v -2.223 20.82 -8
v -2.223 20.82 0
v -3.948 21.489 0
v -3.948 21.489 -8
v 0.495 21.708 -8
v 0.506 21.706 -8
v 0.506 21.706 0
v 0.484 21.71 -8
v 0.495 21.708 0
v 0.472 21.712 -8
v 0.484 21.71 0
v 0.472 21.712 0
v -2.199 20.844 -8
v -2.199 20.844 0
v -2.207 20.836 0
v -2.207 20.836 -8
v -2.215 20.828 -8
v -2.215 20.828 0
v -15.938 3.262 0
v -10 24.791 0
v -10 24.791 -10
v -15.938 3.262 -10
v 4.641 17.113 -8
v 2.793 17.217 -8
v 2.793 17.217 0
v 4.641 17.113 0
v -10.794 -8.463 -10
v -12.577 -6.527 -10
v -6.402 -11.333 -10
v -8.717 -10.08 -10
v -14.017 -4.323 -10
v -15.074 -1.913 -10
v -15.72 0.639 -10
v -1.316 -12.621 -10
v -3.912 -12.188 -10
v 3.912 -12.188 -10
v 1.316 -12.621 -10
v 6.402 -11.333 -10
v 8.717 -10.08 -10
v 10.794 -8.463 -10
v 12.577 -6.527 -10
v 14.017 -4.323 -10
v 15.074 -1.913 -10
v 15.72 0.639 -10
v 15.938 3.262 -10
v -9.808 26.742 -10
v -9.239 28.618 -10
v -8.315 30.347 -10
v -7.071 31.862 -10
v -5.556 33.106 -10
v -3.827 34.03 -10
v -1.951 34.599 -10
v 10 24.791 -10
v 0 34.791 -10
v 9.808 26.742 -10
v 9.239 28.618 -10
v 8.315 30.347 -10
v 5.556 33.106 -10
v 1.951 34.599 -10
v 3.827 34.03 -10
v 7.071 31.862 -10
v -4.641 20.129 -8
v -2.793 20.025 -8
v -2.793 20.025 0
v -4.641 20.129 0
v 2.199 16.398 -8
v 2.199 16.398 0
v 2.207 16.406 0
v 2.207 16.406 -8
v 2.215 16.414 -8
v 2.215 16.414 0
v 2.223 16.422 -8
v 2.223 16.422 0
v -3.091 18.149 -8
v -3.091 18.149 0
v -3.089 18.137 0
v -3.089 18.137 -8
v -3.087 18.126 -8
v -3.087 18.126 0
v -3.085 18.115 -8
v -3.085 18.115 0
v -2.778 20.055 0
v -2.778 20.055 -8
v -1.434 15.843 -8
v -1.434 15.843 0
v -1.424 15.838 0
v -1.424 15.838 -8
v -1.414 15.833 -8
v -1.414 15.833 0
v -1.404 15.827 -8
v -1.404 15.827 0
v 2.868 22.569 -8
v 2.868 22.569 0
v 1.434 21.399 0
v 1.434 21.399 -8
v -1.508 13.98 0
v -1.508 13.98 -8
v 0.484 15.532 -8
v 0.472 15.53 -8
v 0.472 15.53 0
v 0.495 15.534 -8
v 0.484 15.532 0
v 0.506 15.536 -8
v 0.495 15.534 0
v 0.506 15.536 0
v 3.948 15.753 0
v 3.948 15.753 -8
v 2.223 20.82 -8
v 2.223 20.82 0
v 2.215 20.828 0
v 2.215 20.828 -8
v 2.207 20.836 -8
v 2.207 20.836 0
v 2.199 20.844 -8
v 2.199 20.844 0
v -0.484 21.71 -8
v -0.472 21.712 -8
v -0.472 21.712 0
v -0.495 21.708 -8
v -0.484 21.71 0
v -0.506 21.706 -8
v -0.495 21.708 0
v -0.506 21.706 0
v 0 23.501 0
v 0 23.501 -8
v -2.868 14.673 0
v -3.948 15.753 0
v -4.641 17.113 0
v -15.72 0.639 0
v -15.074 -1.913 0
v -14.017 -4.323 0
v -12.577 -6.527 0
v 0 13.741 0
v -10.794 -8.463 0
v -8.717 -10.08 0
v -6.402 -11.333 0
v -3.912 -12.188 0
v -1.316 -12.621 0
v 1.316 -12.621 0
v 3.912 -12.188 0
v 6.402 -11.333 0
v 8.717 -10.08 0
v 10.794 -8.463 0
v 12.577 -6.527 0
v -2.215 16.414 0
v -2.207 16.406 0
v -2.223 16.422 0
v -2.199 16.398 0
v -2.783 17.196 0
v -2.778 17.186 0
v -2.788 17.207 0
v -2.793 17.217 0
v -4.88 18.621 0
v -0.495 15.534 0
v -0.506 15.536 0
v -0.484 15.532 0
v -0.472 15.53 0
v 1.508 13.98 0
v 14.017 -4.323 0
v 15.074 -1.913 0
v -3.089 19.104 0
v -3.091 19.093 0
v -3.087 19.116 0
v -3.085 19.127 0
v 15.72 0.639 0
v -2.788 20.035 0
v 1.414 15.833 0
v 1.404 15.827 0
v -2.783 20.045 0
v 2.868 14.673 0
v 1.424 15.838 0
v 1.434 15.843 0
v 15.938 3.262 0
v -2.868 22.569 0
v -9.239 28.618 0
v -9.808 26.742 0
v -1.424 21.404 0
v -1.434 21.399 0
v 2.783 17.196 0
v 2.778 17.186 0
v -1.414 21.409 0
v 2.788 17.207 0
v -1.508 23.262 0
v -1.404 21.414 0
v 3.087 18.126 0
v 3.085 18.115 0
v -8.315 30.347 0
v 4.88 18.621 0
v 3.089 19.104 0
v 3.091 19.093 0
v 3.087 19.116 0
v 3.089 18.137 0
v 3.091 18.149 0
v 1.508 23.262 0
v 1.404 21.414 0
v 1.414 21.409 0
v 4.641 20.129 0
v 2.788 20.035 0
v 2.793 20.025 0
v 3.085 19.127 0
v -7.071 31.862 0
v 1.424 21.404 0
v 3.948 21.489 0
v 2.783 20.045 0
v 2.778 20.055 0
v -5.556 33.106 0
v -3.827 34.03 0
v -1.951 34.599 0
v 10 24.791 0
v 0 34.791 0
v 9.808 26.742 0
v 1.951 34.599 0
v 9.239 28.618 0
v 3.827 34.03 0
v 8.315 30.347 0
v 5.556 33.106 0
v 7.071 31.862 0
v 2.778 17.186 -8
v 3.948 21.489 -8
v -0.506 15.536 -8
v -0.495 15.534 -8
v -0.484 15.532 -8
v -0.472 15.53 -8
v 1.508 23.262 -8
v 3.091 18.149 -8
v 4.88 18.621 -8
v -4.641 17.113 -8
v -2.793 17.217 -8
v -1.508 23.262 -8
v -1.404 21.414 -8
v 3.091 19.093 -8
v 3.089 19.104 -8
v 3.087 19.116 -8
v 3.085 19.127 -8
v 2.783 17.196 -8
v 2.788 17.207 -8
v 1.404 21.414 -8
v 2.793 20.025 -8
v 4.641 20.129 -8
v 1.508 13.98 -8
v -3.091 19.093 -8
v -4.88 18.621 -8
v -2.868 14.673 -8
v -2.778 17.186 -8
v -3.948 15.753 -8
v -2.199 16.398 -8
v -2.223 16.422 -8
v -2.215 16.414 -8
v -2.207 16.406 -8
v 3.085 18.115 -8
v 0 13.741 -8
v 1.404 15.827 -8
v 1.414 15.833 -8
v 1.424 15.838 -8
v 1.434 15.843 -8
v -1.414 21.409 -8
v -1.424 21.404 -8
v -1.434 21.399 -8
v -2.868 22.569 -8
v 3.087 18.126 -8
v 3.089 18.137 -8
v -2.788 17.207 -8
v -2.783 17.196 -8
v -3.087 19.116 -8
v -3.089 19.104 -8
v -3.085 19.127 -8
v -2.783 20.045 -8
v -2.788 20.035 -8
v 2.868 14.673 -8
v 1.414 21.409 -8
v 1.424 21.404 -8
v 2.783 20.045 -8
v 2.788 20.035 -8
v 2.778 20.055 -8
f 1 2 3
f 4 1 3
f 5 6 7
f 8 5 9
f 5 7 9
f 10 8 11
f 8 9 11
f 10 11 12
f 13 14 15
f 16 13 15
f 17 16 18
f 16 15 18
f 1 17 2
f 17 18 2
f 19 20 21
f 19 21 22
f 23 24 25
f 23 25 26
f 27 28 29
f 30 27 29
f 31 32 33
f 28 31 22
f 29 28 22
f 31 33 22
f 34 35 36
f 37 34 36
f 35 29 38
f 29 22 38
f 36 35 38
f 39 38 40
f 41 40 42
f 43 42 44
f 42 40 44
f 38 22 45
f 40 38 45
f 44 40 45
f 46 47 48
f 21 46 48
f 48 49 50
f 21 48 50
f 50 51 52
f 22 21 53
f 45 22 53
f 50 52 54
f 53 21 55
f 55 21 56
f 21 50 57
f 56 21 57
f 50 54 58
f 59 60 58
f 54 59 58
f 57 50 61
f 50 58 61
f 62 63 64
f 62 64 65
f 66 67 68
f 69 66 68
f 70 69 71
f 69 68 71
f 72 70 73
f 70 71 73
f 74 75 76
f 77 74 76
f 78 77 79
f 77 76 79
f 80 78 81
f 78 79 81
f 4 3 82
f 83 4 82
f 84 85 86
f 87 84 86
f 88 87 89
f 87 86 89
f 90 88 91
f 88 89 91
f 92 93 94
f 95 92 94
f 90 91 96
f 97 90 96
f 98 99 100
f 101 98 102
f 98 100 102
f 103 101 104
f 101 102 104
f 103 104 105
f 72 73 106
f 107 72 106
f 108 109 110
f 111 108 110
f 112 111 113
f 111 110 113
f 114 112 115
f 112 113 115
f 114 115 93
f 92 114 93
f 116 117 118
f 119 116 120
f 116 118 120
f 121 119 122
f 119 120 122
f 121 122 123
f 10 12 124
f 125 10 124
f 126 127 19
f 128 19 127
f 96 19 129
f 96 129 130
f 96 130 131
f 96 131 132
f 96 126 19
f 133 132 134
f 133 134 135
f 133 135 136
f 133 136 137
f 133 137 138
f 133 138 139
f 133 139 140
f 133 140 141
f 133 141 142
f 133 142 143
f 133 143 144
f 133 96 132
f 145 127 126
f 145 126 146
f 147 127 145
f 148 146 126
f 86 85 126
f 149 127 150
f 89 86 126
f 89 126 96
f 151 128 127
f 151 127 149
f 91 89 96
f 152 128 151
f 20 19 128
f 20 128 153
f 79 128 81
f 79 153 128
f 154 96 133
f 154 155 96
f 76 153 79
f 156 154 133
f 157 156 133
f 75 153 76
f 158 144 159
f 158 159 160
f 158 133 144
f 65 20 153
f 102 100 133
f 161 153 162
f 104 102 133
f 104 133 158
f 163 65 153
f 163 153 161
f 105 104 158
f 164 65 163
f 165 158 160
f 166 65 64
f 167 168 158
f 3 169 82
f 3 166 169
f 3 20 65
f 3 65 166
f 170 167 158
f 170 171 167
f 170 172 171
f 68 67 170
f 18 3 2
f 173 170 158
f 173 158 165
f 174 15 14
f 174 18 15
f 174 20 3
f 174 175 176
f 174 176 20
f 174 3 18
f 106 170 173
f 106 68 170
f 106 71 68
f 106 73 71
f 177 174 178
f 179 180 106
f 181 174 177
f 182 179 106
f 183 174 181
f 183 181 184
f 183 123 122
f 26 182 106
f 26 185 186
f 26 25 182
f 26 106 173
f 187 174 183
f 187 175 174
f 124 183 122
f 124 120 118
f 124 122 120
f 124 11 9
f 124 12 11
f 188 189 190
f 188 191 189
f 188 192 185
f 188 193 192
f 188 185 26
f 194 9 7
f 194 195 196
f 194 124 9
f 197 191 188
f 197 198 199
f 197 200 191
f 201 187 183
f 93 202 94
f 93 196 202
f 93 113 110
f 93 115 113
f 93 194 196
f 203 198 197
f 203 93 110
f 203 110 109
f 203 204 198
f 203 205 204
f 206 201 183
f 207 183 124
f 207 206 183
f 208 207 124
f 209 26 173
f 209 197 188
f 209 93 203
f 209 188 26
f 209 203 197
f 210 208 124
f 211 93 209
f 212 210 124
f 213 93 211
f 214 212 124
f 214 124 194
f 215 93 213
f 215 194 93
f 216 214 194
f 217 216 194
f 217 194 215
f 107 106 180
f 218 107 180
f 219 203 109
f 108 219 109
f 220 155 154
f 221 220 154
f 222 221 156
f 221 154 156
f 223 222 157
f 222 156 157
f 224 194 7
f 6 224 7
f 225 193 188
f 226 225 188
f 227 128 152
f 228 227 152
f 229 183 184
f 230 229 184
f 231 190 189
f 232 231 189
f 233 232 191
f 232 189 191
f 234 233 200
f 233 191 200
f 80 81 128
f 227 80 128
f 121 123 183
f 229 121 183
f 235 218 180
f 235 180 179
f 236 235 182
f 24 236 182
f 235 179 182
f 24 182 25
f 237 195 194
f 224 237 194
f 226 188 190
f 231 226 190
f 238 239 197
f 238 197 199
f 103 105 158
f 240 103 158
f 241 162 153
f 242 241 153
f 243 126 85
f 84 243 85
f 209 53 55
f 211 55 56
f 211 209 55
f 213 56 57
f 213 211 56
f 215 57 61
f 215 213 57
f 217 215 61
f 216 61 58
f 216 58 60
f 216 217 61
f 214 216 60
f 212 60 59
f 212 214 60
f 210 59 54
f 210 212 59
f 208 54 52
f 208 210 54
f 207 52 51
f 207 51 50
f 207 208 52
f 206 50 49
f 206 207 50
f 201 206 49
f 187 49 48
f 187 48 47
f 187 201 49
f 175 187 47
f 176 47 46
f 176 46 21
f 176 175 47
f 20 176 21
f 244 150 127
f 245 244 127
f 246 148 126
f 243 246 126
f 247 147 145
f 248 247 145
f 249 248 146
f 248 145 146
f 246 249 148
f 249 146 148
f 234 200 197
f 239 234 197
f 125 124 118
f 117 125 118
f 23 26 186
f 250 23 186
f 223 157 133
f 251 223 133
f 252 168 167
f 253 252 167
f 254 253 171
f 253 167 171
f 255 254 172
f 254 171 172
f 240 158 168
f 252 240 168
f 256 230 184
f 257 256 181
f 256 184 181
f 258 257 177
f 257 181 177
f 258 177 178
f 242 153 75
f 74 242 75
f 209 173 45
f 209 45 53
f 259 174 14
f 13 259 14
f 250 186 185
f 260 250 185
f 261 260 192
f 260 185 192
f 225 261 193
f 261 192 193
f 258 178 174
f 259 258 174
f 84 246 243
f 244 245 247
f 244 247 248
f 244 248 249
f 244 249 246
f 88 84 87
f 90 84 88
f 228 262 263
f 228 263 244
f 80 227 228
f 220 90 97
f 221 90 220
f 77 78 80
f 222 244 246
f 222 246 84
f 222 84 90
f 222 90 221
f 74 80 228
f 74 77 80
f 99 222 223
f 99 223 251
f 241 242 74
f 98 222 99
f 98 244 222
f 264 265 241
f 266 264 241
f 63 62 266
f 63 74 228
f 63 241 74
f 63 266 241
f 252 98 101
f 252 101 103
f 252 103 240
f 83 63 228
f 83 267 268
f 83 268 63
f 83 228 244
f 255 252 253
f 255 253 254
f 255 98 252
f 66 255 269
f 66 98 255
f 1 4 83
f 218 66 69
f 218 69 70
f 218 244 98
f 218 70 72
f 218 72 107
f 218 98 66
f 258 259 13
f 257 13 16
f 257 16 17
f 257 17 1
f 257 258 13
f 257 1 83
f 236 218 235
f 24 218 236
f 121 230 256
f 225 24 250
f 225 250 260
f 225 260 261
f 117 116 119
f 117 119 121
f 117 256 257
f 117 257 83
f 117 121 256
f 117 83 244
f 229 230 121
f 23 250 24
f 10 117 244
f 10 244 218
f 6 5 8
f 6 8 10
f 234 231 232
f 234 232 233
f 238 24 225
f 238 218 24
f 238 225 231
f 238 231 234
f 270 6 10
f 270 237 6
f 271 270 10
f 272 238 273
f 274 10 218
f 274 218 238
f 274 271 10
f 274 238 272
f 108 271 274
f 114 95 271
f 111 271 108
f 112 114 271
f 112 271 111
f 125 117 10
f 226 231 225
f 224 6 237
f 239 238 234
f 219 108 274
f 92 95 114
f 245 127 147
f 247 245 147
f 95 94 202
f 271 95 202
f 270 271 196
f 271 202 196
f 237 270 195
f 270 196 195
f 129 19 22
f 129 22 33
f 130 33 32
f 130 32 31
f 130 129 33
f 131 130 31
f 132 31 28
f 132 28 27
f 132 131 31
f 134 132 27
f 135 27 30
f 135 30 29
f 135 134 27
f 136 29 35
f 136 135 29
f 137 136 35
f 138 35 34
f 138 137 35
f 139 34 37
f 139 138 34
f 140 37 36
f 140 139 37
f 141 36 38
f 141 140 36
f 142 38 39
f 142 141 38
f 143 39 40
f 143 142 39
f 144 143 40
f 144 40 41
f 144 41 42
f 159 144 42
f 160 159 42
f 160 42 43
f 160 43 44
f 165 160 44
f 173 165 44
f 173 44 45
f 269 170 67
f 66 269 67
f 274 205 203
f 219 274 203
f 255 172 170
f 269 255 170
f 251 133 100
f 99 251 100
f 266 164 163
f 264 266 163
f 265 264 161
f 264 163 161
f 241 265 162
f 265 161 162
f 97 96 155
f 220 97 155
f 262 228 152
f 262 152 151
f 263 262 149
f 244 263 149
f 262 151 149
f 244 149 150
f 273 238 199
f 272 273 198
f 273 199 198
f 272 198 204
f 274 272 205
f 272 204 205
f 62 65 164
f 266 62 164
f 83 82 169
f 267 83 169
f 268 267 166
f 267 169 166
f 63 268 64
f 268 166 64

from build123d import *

# Parameters (mm, degrees)
EXTRUDE_1_DEPTH     = 10
CUT_EXTRUDE_2_DEPTH = 8


with BuildPart() as part:
    # 草图1 → 凸台-拉伸1 (new body)
    with BuildSketch(Plane.XY):
        with BuildLine():
            Line((-10, 24.791076412), (-15.93770494, 3.262397709))
            ThreePointArc((-15.93770494, 3.262397709), (0, -12.675307231), (15.93770494, 3.262397709))
            Line((15.93770494, 3.262397709), (10, 24.791076412))
            ThreePointArc((10, 24.791076412), (0, 34.791076412), (-10, 24.791076412))
        make_face()
    extrude(amount=-EXTRUDE_1_DEPTH)

    # 草图3 → 切除-拉伸2 (cut)
    with BuildSketch(Plane.XY):
        with BuildLine():
            Line((0, 23.501027712), (-0.472402553, 21.711669494))
            ThreePointArc((-0.472402553, 21.711669494), (-0.489109338, 21.709069686), (-0.50580182, 21.70637957))
            Line((-0.50580182, 21.70637957), (-1.508025445, 23.262179946))
            Line((-1.508025445, 23.262179946), (-1.404364874, 21.414418736))
            ThreePointArc((-1.404364874, 21.414418736), (-1.419450586, 21.40678349), (-1.434494788, 21.399066778))
            Line((-1.434494788, 21.399066778), (-2.868434853, 22.569016731))
            Line((-2.868434853, 22.569016731), (-2.198858175, 20.84372427))
            ThreePointArc((-2.198858175, 20.84372427), (-2.210846119, 20.831800979), (-2.22276941, 20.819813035))
            Line((-2.22276941, 20.819813035), (-3.948061872, 21.489389712))
            Line((-3.948061872, 21.489389712), (-2.778111918, 20.055449647))
            ThreePointArc((-2.778111918, 20.055449647), (-2.785828631, 20.040405445), (-2.793463876, 20.025319733))
            Line((-2.793463876, 20.025319733), (-4.641225087, 20.128980305))
            Line((-4.641225087, 20.128980305), (-3.085424711, 19.12675668))
            ThreePointArc((-3.085424711, 19.12675668), (-3.088114827, 19.110064198), (-3.090714635, 19.093357413))
            Line((-3.090714635, 19.093357413), (-4.880072853, 18.620954859))
            Line((-4.880072853, 18.620954859), (-3.090714635, 18.148552306))
            ThreePointArc((-3.090714635, 18.148552306), (-3.088114827, 18.131845521), (-3.085424711, 18.115153039))
            Line((-3.085424711, 18.115153039), (-4.641225087, 17.112929414))
            Line((-4.641225087, 17.112929414), (-2.793463876, 17.216589986))
            ThreePointArc((-2.793463876, 17.216589986), (-2.785828631, 17.201504274), (-2.778111918, 17.186460072))
            Line((-2.778111918, 17.186460072), (-3.948061872, 15.752520006))
            Line((-3.948061872, 15.752520006), (-2.22276941, 16.422096684))
            ThreePointArc((-2.22276941, 16.422096684), (-2.210846119, 16.41010874), (-2.198858175, 16.398185449))
            Line((-2.198858175, 16.398185449), (-2.868434853, 14.672892987))
            Line((-2.868434853, 14.672892987), (-1.434494788, 15.842842941))
            ThreePointArc((-1.434494788, 15.842842941), (-1.419450586, 15.835126228), (-1.404364874, 15.827490983))
            Line((-1.404364874, 15.827490983), (-1.508025445, 13.979729772))
            Line((-1.508025445, 13.979729772), (-0.50580182, 15.535530148))
            ThreePointArc((-0.50580182, 15.535530148), (-0.489109338, 15.532840033), (-0.472402553, 15.530240224))
            Line((-0.472402553, 15.530240224), (0, 13.740882006))
            Line((0, 13.740882006), (0.472402553, 15.530240224))
            ThreePointArc((0.472402553, 15.530240224), (0.489109338, 15.532840033), (0.50580182, 15.535530148))
            Line((0.50580182, 15.535530148), (1.508025445, 13.979729772))
            Line((1.508025445, 13.979729772), (1.404364874, 15.827490983))
            ThreePointArc((1.404364874, 15.827490983), (1.419450586, 15.835126228), (1.434494788, 15.842842941))
            Line((1.434494788, 15.842842941), (2.868434853, 14.672892987))
            Line((2.868434853, 14.672892987), (2.198858175, 16.398185449))
            ThreePointArc((2.198858175, 16.398185449), (2.210846119, 16.41010874), (2.22276941, 16.422096684))
            Line((2.22276941, 16.422096684), (3.948061872, 15.752520006))
            Line((3.948061872, 15.752520006), (2.778111918, 17.186460072))
            ThreePointArc((2.778111918, 17.186460072), (2.785828631, 17.201504274), (2.793463876, 17.216589986))
            Line((2.793463876, 17.216589986), (4.641225087, 17.112929414))
            Line((4.641225087, 17.112929414), (3.085424711, 18.115153039))
            ThreePointArc((3.085424711, 18.115153039), (3.088114827, 18.131845521), (3.090714635, 18.148552306))
            Line((3.090714635, 18.148552306), (4.880072853, 18.620954859))
            Line((4.880072853, 18.620954859), (3.090714635, 19.093357413))
            ThreePointArc((3.090714635, 19.093357413), (3.088114827, 19.110064198), (3.085424711, 19.12675668))
            Line((3.085424711, 19.12675668), (4.641225087, 20.128980305))
            Line((4.641225087, 20.128980305), (2.793463876, 20.025319733))
            ThreePointArc((2.793463876, 20.025319733), (2.785828631, 20.040405445), (2.778111918, 20.055449647))
            Line((2.778111918, 20.055449647), (3.948061872, 21.489389712))
            Line((3.948061872, 21.489389712), (2.22276941, 20.819813035))
            ThreePointArc((2.22276941, 20.819813035), (2.210846119, 20.831800979), (2.198858175, 20.84372427))
            Line((2.198858175, 20.84372427), (2.868434853, 22.569016731))
            Line((2.868434853, 22.569016731), (1.434494788, 21.399066778))
            ThreePointArc((1.434494788, 21.399066778), (1.419450586, 21.40678349), (1.404364874, 21.414418736))
            Line((1.404364874, 21.414418736), (1.508025445, 23.262179946))
            Line((1.508025445, 23.262179946), (0.50580182, 21.70637957))
            ThreePointArc((0.50580182, 21.70637957), (0.489109338, 21.709069686), (0.472402553, 21.711669494))
            Line((0.472402553, 21.711669494), (0, 23.501027712))
        make_face()
    extrude(amount=-CUT_EXTRUDE_2_DEPTH, mode=Mode.SUBTRACT)


solid = part.part
